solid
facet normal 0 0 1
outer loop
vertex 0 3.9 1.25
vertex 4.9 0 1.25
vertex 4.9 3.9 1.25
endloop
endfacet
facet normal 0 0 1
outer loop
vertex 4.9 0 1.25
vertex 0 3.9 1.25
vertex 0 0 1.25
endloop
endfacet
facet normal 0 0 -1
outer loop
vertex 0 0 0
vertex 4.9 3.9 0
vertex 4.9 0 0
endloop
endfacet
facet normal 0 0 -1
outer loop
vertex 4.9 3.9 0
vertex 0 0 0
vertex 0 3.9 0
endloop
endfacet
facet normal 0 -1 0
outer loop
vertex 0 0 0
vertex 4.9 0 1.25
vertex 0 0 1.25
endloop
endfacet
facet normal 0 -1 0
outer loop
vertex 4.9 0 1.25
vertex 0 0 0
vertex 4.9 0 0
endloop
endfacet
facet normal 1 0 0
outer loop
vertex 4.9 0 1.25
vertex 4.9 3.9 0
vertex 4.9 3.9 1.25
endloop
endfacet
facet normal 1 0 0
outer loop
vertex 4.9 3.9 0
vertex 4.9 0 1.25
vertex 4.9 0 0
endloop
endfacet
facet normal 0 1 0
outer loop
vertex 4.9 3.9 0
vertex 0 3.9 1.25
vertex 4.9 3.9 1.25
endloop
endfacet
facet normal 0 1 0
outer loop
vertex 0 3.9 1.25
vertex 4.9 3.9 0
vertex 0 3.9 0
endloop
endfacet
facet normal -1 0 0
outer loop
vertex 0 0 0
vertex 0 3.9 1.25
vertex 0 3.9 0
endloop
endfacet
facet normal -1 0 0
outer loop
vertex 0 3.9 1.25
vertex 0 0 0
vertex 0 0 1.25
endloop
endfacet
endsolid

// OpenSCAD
// Simple SMD block: exact overall dimensions [4.90, 3.90, 1.25]
// One connected solid, no extra protrusions/steps, no text.

body_length = 4.90;
body_width  = 3.90;
body_height = 1.25;

union() {
    cube([body_length, body_width, body_height], center=false);
}
